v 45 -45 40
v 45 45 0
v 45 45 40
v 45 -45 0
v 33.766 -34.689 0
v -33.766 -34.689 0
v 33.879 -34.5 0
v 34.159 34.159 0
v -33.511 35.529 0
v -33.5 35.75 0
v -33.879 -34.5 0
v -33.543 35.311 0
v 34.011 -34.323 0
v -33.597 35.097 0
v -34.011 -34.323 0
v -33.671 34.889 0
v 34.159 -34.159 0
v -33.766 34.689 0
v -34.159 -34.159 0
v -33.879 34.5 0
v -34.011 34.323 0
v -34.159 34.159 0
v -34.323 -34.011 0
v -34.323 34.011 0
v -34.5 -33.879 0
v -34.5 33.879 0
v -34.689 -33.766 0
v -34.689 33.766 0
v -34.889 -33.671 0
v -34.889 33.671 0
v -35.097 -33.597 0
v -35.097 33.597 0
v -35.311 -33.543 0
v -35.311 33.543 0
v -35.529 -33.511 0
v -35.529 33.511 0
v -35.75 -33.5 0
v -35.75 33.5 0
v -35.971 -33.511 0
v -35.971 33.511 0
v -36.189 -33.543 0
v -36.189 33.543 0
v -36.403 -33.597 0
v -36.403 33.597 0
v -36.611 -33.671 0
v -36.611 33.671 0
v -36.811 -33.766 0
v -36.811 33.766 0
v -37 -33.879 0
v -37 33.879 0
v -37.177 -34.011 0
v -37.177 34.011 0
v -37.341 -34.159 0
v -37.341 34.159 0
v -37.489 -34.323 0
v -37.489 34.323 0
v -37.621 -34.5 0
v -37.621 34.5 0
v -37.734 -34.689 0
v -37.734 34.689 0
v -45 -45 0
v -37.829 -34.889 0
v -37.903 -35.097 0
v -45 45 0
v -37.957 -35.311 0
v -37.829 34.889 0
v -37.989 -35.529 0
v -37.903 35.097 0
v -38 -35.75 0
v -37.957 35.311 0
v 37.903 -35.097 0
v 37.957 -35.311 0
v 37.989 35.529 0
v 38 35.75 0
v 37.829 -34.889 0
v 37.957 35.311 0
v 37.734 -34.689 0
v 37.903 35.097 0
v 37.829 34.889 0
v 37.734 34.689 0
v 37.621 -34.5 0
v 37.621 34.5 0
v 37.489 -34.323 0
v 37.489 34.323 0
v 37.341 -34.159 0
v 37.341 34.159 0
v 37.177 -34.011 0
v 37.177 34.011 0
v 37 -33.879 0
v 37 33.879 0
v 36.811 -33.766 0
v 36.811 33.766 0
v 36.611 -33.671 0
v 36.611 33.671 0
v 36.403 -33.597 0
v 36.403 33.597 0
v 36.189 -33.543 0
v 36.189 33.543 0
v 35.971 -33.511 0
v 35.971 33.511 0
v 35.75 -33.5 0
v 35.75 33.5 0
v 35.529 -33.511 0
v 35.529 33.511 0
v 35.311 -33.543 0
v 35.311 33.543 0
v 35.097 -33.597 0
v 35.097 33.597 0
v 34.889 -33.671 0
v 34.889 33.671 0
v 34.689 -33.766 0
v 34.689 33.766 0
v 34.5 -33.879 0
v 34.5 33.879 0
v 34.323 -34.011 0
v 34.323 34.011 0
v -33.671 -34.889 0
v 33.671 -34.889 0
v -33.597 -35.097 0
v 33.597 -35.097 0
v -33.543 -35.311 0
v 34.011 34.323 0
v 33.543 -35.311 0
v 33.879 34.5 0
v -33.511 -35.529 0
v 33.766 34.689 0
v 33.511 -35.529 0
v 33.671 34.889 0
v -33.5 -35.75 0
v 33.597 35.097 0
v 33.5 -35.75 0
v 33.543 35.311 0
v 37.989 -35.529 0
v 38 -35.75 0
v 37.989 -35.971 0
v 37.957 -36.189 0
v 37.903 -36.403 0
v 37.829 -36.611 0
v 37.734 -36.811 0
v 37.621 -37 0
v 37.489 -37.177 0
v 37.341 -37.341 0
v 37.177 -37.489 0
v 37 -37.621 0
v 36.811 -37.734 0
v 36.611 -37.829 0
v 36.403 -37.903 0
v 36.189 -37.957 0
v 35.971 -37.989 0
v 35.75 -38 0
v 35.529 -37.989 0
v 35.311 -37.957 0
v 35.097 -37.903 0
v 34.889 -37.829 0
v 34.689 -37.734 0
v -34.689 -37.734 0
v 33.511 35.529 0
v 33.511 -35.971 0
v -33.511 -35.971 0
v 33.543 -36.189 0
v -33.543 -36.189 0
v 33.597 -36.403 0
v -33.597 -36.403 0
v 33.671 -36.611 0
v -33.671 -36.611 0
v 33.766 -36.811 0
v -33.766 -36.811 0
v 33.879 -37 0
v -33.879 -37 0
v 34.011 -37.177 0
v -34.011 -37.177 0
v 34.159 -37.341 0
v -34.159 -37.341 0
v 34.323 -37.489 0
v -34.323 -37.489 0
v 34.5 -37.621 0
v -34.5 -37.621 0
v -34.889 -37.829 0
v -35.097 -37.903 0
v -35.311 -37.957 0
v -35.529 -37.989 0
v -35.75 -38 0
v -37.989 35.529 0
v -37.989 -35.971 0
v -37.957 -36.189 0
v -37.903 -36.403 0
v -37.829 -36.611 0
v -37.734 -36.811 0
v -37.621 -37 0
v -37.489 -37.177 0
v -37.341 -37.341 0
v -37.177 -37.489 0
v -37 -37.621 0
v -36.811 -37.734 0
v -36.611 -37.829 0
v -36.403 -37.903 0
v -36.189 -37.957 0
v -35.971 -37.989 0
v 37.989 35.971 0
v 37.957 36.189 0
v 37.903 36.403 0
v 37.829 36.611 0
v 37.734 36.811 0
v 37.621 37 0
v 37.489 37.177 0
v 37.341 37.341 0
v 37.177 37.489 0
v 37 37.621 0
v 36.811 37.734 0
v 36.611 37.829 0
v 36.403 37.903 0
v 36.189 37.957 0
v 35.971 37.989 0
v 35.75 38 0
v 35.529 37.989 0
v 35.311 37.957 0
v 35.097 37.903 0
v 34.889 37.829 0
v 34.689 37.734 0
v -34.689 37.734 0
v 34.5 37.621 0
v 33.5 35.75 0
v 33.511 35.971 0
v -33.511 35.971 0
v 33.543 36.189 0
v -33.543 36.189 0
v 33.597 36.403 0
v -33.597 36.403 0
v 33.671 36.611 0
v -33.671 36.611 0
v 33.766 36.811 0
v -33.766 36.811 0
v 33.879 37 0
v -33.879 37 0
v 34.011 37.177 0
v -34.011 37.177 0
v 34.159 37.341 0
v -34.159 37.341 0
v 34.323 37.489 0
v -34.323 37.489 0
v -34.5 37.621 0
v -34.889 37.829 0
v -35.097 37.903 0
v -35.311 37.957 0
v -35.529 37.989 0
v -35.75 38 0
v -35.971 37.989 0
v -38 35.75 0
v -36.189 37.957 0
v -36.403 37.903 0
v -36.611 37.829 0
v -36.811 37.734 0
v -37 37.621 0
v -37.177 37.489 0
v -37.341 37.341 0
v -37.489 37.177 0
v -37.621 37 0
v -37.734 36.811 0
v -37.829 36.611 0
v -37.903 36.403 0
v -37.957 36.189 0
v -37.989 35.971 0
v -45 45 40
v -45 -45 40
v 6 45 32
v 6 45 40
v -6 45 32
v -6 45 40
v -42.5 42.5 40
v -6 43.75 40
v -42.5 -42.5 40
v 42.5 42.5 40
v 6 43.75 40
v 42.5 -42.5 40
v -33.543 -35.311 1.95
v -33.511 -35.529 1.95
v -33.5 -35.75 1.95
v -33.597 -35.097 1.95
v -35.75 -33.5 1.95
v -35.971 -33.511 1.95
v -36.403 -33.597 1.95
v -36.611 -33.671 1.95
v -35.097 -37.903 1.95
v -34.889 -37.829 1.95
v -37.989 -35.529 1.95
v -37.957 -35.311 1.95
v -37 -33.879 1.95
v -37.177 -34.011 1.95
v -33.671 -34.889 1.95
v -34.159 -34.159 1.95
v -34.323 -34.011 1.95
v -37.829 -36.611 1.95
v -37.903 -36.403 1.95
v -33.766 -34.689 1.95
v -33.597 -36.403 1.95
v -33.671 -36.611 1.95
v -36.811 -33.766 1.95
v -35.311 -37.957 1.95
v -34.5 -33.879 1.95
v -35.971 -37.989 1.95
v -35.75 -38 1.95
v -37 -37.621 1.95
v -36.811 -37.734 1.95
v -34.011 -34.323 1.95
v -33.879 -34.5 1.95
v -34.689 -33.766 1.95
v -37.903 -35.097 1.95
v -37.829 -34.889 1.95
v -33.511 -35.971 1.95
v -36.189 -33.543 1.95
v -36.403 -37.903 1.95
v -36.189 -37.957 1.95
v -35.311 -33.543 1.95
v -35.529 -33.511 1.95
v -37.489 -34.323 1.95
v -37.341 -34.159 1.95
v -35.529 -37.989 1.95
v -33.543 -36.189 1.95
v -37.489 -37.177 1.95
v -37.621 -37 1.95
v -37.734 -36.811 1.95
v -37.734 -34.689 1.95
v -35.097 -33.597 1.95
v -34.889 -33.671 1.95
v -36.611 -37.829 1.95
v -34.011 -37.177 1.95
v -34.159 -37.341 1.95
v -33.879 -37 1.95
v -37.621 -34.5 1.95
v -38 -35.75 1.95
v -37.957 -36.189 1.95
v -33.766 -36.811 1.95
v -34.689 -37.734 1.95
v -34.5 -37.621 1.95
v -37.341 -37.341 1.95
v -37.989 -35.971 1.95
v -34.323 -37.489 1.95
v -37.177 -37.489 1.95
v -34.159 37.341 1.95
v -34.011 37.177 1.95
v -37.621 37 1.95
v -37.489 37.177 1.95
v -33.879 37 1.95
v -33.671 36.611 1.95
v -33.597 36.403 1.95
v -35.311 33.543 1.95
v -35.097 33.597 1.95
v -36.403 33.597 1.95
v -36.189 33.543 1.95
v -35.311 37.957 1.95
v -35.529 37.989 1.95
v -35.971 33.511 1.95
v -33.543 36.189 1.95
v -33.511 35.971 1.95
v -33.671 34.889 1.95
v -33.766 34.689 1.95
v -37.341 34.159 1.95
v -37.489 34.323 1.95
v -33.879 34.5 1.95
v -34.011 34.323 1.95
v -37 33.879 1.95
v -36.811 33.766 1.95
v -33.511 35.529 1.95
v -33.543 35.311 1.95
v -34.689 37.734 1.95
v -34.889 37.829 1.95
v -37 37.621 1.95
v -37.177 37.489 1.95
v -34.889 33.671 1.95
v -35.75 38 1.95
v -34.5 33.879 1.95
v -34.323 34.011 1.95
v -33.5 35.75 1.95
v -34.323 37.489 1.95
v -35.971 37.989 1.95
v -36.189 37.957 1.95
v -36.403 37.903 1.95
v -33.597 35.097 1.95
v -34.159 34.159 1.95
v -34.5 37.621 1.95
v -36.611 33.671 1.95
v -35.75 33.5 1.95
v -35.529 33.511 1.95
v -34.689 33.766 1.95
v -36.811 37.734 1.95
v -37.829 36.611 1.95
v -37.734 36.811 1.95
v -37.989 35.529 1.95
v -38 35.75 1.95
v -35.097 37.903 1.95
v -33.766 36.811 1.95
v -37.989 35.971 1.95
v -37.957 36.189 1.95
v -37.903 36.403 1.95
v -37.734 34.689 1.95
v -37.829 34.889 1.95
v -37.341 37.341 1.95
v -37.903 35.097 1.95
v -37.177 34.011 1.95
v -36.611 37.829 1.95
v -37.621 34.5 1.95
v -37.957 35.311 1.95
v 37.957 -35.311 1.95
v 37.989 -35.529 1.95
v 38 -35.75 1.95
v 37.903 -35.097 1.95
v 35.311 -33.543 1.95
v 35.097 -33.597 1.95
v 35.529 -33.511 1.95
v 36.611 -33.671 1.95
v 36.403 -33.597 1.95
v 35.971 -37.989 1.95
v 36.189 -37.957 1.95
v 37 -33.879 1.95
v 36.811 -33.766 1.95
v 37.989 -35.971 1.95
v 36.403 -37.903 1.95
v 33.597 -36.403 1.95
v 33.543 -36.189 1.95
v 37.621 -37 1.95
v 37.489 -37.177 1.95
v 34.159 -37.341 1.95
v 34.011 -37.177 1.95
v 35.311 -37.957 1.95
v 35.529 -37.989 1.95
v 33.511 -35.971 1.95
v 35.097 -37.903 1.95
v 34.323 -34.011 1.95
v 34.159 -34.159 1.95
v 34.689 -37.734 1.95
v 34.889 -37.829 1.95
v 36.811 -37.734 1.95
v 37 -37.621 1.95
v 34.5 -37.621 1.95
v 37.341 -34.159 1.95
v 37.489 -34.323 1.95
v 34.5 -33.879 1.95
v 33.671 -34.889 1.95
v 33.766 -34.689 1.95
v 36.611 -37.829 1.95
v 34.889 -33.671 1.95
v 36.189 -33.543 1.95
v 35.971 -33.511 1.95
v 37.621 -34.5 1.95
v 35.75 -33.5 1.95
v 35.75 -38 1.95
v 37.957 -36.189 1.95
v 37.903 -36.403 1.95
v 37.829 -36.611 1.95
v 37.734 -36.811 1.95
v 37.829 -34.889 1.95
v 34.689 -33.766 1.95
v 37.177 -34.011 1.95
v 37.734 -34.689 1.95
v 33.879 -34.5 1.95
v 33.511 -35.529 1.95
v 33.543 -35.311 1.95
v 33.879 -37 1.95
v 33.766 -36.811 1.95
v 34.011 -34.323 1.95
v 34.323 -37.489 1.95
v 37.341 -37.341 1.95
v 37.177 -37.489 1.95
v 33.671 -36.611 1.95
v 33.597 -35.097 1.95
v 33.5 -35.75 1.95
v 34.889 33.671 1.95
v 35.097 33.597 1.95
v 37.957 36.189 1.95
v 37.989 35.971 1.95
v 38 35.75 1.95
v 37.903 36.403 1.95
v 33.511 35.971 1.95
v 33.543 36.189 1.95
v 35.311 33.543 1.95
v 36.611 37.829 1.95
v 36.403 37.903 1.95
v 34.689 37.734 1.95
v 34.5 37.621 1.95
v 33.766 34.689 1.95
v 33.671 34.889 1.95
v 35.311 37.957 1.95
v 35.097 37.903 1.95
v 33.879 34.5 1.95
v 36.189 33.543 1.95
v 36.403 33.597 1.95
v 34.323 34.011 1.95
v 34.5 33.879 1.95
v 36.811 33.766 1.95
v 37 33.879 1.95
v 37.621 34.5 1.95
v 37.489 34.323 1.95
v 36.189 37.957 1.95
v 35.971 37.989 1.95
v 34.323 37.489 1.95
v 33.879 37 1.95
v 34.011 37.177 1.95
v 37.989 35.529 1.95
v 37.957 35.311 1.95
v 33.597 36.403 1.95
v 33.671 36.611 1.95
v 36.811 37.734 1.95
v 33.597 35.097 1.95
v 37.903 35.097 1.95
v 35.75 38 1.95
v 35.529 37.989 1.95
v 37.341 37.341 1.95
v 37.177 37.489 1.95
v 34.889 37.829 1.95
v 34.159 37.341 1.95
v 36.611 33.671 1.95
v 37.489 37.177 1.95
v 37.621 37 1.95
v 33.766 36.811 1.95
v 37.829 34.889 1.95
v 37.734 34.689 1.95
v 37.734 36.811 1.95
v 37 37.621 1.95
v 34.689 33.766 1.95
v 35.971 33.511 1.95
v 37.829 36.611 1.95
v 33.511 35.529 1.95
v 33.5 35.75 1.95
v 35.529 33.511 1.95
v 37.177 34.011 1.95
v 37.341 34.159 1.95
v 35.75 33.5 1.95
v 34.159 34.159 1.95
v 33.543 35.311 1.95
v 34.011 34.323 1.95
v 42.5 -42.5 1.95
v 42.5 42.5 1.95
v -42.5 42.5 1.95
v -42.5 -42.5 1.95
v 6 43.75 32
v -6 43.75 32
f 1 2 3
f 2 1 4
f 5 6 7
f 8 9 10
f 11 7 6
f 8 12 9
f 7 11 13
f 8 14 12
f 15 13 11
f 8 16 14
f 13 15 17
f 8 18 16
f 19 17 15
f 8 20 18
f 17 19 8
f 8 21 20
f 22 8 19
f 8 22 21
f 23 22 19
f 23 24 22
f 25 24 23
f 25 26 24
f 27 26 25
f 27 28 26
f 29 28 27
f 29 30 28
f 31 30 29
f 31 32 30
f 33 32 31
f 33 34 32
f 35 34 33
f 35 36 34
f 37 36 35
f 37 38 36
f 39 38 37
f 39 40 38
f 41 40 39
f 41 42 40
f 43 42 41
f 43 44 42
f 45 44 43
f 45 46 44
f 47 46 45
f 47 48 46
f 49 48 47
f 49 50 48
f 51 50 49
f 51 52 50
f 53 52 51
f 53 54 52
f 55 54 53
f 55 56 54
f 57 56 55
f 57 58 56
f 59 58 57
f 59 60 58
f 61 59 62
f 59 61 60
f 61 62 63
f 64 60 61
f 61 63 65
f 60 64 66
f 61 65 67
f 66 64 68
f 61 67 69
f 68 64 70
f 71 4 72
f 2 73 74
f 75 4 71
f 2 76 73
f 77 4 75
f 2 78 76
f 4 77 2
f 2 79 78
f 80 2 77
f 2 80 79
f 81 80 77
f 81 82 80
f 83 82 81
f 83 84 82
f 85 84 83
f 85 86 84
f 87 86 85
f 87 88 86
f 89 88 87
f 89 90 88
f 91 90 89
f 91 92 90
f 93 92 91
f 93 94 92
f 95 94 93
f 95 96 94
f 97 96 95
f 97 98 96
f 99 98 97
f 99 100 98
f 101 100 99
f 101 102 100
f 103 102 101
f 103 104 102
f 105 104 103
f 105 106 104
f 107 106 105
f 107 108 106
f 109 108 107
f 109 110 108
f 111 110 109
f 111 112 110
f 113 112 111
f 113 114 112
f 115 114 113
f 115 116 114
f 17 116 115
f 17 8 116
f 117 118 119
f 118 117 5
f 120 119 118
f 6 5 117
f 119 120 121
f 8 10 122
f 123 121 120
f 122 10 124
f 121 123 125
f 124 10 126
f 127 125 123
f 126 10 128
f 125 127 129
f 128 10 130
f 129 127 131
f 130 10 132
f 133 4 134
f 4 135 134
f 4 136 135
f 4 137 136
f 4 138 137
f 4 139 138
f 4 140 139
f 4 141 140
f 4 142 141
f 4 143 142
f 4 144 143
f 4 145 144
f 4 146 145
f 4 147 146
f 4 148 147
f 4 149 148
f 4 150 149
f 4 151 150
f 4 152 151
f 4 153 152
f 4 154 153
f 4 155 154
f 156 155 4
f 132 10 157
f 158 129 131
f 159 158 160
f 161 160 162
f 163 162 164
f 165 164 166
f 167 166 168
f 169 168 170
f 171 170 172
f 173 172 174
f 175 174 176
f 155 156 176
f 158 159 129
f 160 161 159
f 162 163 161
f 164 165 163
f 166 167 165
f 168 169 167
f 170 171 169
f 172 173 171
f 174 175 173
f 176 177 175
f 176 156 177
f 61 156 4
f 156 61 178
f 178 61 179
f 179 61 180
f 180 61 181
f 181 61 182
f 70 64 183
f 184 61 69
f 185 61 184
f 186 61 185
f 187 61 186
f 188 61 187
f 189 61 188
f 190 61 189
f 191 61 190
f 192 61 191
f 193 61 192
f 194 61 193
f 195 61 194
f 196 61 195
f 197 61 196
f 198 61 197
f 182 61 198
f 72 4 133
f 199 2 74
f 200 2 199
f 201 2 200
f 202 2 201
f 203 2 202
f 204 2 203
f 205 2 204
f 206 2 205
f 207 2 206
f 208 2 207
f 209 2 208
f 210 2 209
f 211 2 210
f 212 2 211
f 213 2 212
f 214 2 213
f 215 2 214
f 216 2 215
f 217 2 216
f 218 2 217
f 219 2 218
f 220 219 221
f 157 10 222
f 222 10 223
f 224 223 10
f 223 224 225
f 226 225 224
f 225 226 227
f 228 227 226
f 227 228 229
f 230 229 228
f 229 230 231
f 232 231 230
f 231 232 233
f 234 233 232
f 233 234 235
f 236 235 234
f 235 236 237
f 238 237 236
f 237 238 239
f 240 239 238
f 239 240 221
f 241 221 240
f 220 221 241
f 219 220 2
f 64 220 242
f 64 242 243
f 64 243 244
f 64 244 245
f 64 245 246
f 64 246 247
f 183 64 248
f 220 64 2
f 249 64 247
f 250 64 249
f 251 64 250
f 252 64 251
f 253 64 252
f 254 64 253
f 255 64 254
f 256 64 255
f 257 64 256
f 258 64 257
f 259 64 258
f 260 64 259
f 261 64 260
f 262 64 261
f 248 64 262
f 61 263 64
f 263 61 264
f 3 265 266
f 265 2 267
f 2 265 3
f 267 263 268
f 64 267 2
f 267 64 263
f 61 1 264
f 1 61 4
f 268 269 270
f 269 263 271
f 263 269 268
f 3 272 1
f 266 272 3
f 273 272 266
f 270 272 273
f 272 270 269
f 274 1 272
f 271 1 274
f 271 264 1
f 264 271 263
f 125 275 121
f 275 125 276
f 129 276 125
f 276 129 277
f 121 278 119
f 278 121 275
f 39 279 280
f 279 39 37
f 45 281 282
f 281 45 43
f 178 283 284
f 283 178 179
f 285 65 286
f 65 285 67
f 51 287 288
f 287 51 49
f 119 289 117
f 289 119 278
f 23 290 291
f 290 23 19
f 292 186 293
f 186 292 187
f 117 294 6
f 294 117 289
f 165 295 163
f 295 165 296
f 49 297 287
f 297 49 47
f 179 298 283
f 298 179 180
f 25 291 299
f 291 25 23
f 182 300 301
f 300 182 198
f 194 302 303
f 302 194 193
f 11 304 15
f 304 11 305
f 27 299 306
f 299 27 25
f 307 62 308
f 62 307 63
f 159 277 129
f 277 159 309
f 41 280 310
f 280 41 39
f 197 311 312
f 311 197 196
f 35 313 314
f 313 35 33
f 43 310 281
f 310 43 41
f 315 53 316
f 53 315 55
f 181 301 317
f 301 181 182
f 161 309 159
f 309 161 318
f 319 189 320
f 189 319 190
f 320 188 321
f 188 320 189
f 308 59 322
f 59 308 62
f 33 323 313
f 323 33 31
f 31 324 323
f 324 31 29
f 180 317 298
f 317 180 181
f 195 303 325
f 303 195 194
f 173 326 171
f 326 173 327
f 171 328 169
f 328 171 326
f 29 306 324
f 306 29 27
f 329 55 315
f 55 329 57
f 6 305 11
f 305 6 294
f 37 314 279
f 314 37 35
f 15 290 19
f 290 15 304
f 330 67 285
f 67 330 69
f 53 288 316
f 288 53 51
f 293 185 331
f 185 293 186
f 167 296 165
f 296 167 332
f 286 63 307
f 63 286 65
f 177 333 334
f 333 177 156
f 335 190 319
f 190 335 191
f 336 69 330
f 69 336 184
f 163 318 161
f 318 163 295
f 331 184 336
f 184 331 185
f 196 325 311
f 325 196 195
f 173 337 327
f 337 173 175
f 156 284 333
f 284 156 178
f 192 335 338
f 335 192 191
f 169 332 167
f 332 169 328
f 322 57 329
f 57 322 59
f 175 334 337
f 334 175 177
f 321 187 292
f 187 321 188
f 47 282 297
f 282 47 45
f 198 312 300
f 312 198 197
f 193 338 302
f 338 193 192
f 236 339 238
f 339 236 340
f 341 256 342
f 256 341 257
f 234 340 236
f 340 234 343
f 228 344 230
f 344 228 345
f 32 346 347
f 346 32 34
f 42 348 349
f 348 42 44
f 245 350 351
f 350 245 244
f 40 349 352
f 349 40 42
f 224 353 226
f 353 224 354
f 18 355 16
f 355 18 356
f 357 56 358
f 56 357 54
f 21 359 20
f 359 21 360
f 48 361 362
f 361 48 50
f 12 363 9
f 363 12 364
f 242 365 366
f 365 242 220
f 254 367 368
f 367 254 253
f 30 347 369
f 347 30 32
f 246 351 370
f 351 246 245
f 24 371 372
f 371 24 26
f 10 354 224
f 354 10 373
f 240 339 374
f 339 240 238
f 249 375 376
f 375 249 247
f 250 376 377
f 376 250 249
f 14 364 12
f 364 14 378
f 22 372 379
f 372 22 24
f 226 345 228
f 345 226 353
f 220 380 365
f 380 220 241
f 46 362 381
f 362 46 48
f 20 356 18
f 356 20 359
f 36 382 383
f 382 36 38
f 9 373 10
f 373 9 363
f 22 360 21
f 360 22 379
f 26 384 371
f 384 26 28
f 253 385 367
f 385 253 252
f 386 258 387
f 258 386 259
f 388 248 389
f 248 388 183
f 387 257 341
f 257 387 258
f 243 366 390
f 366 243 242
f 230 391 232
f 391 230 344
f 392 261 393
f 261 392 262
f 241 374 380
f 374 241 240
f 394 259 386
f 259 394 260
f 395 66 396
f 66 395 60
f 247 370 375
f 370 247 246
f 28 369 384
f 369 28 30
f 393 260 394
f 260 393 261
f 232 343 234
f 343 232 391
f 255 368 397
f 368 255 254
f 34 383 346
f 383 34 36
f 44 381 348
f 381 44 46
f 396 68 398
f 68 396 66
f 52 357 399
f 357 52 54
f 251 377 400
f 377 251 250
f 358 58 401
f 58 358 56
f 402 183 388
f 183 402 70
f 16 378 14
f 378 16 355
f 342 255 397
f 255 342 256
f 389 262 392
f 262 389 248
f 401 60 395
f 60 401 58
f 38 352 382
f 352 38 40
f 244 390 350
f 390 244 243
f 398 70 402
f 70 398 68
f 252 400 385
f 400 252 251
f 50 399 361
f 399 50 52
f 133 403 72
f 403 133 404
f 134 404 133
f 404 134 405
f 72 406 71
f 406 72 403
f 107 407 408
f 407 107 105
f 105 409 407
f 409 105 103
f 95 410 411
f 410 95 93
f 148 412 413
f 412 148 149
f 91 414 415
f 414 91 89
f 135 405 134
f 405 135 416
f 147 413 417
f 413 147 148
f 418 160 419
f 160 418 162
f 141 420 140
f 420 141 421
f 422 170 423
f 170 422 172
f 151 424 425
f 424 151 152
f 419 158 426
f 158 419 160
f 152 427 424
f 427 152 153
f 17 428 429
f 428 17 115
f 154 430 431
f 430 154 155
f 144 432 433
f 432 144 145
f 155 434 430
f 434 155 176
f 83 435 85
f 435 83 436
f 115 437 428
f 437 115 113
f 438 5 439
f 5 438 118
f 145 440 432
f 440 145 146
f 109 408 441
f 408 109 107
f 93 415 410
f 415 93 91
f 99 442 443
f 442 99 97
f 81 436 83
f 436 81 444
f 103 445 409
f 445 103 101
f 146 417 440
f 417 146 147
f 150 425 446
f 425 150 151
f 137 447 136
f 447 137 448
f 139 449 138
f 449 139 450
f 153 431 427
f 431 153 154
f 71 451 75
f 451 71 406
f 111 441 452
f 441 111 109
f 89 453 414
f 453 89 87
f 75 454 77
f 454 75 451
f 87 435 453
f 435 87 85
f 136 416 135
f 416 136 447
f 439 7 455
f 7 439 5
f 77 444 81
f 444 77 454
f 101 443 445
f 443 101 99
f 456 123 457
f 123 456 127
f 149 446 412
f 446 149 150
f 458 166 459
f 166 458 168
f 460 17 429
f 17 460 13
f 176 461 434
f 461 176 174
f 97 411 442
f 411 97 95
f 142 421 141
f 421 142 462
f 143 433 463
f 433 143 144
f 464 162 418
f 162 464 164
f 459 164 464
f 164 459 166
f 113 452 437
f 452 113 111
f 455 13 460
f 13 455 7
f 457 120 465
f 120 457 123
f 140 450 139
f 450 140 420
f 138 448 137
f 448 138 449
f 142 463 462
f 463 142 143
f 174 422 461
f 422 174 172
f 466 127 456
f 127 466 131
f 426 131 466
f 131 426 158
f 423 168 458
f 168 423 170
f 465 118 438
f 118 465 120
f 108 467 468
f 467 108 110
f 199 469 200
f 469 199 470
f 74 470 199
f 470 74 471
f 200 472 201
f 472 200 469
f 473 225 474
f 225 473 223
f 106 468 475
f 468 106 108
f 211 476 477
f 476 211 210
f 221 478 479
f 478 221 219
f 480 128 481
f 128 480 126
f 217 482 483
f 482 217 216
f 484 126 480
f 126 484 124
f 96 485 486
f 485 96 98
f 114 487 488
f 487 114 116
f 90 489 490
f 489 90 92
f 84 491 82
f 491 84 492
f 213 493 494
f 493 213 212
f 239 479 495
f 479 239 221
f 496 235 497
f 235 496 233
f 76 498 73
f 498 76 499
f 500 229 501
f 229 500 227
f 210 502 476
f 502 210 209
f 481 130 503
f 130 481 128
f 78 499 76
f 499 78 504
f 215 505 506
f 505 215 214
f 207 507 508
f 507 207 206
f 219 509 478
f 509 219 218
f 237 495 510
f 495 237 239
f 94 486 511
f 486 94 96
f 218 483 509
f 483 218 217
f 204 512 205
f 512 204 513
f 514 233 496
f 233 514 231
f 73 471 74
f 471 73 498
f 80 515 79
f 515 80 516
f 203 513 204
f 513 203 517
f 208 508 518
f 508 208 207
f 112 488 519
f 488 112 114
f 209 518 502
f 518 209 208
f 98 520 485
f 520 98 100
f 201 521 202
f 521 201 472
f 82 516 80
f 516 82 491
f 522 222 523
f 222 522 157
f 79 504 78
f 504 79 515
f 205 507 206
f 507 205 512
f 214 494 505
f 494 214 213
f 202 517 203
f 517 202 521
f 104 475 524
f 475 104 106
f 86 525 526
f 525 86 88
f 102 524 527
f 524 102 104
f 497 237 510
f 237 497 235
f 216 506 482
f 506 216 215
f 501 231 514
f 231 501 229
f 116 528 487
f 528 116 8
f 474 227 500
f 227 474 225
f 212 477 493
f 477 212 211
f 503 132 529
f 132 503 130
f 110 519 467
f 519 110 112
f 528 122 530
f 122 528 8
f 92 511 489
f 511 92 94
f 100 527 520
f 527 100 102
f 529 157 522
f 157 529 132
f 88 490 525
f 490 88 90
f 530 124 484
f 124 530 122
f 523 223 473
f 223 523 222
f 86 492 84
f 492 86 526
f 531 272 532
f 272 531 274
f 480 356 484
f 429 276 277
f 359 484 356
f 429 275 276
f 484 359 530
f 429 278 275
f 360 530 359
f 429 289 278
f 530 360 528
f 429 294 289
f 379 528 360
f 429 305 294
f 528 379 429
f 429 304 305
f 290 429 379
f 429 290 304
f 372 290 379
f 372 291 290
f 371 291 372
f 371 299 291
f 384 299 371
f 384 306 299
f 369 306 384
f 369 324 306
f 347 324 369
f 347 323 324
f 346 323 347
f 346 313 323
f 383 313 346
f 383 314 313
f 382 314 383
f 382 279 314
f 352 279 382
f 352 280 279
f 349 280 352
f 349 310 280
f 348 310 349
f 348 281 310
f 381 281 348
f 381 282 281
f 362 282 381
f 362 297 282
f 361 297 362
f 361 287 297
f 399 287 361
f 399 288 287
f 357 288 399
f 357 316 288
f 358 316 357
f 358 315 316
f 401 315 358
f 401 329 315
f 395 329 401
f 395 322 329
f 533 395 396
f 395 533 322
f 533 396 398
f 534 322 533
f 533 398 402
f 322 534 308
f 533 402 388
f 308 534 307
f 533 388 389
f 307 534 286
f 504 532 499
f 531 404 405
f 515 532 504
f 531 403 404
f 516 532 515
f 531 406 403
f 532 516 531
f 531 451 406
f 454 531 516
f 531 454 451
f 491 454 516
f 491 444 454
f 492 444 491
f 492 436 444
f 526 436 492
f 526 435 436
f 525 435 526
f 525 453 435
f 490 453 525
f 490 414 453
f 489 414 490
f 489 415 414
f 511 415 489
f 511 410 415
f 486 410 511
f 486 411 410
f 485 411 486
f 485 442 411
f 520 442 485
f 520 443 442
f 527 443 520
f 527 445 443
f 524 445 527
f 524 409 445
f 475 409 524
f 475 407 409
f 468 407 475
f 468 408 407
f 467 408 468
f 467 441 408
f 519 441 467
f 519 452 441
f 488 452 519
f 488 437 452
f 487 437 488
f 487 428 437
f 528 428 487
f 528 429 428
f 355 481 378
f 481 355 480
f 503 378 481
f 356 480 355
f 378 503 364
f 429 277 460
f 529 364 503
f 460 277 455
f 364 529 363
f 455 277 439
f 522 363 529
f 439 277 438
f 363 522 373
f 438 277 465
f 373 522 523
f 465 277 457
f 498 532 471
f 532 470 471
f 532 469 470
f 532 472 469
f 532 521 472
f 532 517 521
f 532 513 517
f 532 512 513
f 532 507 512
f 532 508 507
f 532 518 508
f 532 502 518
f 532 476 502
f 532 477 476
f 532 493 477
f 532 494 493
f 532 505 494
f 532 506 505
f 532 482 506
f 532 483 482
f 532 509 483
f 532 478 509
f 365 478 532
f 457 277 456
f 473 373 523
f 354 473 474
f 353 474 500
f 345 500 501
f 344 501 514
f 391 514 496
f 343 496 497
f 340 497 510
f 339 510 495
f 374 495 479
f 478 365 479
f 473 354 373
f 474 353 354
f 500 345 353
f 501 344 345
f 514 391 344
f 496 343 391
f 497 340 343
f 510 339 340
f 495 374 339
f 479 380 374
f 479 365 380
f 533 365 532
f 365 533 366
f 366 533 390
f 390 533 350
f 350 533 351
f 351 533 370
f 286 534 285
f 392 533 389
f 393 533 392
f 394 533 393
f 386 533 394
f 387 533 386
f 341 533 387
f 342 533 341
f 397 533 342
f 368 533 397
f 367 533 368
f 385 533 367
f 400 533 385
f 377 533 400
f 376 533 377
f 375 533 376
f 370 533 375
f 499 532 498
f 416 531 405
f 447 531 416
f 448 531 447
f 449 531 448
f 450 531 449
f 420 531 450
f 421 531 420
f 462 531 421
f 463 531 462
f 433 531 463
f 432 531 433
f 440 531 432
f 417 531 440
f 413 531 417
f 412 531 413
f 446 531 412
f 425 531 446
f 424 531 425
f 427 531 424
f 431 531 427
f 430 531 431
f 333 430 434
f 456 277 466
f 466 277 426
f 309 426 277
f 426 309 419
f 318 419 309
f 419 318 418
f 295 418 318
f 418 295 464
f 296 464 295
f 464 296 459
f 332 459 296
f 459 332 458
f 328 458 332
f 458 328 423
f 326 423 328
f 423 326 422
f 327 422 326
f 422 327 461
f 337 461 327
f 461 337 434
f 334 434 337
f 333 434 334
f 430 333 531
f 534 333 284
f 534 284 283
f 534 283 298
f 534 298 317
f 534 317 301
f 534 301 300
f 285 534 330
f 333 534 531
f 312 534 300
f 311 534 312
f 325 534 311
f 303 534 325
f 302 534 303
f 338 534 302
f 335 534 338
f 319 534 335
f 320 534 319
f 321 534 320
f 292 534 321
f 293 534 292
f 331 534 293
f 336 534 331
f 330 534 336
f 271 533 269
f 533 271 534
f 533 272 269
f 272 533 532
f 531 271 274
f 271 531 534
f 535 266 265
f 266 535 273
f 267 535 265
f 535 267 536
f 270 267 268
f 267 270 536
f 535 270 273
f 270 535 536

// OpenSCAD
// DIY Magnetic Stirrer Housing
// Upside-down open box for 80mm PC fan
// Print orientation: top plate on bed (z=0-2), walls rising to z=40

// Dimensions (all in mm)
outer_size = 90;              // Outer dimension 90 x 90 mm
top_plate_thickness = 2;      // Top plate thickness
wall_thickness = 2.5;         // Wall thickness on all sides
total_height = 40;            // Total height from bed to open edge
mounting_hole_diameter = 4.5; // M4 screw hole diameter
mounting_hole_pattern = 71.5; // Mounting hole square pattern (center-to-center)
cable_notch_width = 12;       // Power cable notch width
cable_notch_depth = 8;        // Notch depth from open edge

// Resolution for curves
$fn = 64;

// Derived dimensions
inner_size = outer_size - 2 * wall_thickness;  // 85 mm inner cavity
wall_height = total_height - top_plate_thickness;  // 38 mm
hole_offset = mounting_hole_pattern / 2;  // 35.75 mm from center to each hole

difference() {
    // Create outer box shell
    union() {
        // Top plate: 90 x 90 x 2 mm at z = 0 to 2
        translate([0, 0, top_plate_thickness / 2])
            cube([outer_size, outer_size, top_plate_thickness], center = true);
        
        // Walls: 90 x 90 outer, rising from z = 2 to z = 40
        translate([0, 0, top_plate_thickness + wall_height / 2])
            cube([outer_size, outer_size, wall_height], center = true);
    }
    
    // Cut out interior cavity (hollow the walls)
    // Creates 85 x 85 mm cavity from z = 2 to z = 40
    translate([0, 0, top_plate_thickness + wall_height / 2])
        cube([inner_size, inner_size, wall_height + 0.1], center = true);
    
    // Drill four M4 mounting holes through top plate
    // 71.5 mm square pattern, centered on plate
    for (dx = [-1, 1]) {
        for (dy = [-1, 1]) {
            translate([dx * hole_offset, dy * hole_offset, -0.5])
                cylinder(h = top_plate_thickness + 1, r = mounting_hole_diameter / 2, $fn = 64);
        }
    }
    
    // Power cable notch in +Y wall
    // 12 mm wide (X direction), centered, 8 mm deep from open edge (z = 32 to z = 40)
    notch_z_center = total_height - cable_notch_depth / 2;
    translate([0, outer_size / 2 + 0.5, notch_z_center])
        cube([cable_notch_width, wall_thickness + 1, cable_notch_depth], center = true);
}
